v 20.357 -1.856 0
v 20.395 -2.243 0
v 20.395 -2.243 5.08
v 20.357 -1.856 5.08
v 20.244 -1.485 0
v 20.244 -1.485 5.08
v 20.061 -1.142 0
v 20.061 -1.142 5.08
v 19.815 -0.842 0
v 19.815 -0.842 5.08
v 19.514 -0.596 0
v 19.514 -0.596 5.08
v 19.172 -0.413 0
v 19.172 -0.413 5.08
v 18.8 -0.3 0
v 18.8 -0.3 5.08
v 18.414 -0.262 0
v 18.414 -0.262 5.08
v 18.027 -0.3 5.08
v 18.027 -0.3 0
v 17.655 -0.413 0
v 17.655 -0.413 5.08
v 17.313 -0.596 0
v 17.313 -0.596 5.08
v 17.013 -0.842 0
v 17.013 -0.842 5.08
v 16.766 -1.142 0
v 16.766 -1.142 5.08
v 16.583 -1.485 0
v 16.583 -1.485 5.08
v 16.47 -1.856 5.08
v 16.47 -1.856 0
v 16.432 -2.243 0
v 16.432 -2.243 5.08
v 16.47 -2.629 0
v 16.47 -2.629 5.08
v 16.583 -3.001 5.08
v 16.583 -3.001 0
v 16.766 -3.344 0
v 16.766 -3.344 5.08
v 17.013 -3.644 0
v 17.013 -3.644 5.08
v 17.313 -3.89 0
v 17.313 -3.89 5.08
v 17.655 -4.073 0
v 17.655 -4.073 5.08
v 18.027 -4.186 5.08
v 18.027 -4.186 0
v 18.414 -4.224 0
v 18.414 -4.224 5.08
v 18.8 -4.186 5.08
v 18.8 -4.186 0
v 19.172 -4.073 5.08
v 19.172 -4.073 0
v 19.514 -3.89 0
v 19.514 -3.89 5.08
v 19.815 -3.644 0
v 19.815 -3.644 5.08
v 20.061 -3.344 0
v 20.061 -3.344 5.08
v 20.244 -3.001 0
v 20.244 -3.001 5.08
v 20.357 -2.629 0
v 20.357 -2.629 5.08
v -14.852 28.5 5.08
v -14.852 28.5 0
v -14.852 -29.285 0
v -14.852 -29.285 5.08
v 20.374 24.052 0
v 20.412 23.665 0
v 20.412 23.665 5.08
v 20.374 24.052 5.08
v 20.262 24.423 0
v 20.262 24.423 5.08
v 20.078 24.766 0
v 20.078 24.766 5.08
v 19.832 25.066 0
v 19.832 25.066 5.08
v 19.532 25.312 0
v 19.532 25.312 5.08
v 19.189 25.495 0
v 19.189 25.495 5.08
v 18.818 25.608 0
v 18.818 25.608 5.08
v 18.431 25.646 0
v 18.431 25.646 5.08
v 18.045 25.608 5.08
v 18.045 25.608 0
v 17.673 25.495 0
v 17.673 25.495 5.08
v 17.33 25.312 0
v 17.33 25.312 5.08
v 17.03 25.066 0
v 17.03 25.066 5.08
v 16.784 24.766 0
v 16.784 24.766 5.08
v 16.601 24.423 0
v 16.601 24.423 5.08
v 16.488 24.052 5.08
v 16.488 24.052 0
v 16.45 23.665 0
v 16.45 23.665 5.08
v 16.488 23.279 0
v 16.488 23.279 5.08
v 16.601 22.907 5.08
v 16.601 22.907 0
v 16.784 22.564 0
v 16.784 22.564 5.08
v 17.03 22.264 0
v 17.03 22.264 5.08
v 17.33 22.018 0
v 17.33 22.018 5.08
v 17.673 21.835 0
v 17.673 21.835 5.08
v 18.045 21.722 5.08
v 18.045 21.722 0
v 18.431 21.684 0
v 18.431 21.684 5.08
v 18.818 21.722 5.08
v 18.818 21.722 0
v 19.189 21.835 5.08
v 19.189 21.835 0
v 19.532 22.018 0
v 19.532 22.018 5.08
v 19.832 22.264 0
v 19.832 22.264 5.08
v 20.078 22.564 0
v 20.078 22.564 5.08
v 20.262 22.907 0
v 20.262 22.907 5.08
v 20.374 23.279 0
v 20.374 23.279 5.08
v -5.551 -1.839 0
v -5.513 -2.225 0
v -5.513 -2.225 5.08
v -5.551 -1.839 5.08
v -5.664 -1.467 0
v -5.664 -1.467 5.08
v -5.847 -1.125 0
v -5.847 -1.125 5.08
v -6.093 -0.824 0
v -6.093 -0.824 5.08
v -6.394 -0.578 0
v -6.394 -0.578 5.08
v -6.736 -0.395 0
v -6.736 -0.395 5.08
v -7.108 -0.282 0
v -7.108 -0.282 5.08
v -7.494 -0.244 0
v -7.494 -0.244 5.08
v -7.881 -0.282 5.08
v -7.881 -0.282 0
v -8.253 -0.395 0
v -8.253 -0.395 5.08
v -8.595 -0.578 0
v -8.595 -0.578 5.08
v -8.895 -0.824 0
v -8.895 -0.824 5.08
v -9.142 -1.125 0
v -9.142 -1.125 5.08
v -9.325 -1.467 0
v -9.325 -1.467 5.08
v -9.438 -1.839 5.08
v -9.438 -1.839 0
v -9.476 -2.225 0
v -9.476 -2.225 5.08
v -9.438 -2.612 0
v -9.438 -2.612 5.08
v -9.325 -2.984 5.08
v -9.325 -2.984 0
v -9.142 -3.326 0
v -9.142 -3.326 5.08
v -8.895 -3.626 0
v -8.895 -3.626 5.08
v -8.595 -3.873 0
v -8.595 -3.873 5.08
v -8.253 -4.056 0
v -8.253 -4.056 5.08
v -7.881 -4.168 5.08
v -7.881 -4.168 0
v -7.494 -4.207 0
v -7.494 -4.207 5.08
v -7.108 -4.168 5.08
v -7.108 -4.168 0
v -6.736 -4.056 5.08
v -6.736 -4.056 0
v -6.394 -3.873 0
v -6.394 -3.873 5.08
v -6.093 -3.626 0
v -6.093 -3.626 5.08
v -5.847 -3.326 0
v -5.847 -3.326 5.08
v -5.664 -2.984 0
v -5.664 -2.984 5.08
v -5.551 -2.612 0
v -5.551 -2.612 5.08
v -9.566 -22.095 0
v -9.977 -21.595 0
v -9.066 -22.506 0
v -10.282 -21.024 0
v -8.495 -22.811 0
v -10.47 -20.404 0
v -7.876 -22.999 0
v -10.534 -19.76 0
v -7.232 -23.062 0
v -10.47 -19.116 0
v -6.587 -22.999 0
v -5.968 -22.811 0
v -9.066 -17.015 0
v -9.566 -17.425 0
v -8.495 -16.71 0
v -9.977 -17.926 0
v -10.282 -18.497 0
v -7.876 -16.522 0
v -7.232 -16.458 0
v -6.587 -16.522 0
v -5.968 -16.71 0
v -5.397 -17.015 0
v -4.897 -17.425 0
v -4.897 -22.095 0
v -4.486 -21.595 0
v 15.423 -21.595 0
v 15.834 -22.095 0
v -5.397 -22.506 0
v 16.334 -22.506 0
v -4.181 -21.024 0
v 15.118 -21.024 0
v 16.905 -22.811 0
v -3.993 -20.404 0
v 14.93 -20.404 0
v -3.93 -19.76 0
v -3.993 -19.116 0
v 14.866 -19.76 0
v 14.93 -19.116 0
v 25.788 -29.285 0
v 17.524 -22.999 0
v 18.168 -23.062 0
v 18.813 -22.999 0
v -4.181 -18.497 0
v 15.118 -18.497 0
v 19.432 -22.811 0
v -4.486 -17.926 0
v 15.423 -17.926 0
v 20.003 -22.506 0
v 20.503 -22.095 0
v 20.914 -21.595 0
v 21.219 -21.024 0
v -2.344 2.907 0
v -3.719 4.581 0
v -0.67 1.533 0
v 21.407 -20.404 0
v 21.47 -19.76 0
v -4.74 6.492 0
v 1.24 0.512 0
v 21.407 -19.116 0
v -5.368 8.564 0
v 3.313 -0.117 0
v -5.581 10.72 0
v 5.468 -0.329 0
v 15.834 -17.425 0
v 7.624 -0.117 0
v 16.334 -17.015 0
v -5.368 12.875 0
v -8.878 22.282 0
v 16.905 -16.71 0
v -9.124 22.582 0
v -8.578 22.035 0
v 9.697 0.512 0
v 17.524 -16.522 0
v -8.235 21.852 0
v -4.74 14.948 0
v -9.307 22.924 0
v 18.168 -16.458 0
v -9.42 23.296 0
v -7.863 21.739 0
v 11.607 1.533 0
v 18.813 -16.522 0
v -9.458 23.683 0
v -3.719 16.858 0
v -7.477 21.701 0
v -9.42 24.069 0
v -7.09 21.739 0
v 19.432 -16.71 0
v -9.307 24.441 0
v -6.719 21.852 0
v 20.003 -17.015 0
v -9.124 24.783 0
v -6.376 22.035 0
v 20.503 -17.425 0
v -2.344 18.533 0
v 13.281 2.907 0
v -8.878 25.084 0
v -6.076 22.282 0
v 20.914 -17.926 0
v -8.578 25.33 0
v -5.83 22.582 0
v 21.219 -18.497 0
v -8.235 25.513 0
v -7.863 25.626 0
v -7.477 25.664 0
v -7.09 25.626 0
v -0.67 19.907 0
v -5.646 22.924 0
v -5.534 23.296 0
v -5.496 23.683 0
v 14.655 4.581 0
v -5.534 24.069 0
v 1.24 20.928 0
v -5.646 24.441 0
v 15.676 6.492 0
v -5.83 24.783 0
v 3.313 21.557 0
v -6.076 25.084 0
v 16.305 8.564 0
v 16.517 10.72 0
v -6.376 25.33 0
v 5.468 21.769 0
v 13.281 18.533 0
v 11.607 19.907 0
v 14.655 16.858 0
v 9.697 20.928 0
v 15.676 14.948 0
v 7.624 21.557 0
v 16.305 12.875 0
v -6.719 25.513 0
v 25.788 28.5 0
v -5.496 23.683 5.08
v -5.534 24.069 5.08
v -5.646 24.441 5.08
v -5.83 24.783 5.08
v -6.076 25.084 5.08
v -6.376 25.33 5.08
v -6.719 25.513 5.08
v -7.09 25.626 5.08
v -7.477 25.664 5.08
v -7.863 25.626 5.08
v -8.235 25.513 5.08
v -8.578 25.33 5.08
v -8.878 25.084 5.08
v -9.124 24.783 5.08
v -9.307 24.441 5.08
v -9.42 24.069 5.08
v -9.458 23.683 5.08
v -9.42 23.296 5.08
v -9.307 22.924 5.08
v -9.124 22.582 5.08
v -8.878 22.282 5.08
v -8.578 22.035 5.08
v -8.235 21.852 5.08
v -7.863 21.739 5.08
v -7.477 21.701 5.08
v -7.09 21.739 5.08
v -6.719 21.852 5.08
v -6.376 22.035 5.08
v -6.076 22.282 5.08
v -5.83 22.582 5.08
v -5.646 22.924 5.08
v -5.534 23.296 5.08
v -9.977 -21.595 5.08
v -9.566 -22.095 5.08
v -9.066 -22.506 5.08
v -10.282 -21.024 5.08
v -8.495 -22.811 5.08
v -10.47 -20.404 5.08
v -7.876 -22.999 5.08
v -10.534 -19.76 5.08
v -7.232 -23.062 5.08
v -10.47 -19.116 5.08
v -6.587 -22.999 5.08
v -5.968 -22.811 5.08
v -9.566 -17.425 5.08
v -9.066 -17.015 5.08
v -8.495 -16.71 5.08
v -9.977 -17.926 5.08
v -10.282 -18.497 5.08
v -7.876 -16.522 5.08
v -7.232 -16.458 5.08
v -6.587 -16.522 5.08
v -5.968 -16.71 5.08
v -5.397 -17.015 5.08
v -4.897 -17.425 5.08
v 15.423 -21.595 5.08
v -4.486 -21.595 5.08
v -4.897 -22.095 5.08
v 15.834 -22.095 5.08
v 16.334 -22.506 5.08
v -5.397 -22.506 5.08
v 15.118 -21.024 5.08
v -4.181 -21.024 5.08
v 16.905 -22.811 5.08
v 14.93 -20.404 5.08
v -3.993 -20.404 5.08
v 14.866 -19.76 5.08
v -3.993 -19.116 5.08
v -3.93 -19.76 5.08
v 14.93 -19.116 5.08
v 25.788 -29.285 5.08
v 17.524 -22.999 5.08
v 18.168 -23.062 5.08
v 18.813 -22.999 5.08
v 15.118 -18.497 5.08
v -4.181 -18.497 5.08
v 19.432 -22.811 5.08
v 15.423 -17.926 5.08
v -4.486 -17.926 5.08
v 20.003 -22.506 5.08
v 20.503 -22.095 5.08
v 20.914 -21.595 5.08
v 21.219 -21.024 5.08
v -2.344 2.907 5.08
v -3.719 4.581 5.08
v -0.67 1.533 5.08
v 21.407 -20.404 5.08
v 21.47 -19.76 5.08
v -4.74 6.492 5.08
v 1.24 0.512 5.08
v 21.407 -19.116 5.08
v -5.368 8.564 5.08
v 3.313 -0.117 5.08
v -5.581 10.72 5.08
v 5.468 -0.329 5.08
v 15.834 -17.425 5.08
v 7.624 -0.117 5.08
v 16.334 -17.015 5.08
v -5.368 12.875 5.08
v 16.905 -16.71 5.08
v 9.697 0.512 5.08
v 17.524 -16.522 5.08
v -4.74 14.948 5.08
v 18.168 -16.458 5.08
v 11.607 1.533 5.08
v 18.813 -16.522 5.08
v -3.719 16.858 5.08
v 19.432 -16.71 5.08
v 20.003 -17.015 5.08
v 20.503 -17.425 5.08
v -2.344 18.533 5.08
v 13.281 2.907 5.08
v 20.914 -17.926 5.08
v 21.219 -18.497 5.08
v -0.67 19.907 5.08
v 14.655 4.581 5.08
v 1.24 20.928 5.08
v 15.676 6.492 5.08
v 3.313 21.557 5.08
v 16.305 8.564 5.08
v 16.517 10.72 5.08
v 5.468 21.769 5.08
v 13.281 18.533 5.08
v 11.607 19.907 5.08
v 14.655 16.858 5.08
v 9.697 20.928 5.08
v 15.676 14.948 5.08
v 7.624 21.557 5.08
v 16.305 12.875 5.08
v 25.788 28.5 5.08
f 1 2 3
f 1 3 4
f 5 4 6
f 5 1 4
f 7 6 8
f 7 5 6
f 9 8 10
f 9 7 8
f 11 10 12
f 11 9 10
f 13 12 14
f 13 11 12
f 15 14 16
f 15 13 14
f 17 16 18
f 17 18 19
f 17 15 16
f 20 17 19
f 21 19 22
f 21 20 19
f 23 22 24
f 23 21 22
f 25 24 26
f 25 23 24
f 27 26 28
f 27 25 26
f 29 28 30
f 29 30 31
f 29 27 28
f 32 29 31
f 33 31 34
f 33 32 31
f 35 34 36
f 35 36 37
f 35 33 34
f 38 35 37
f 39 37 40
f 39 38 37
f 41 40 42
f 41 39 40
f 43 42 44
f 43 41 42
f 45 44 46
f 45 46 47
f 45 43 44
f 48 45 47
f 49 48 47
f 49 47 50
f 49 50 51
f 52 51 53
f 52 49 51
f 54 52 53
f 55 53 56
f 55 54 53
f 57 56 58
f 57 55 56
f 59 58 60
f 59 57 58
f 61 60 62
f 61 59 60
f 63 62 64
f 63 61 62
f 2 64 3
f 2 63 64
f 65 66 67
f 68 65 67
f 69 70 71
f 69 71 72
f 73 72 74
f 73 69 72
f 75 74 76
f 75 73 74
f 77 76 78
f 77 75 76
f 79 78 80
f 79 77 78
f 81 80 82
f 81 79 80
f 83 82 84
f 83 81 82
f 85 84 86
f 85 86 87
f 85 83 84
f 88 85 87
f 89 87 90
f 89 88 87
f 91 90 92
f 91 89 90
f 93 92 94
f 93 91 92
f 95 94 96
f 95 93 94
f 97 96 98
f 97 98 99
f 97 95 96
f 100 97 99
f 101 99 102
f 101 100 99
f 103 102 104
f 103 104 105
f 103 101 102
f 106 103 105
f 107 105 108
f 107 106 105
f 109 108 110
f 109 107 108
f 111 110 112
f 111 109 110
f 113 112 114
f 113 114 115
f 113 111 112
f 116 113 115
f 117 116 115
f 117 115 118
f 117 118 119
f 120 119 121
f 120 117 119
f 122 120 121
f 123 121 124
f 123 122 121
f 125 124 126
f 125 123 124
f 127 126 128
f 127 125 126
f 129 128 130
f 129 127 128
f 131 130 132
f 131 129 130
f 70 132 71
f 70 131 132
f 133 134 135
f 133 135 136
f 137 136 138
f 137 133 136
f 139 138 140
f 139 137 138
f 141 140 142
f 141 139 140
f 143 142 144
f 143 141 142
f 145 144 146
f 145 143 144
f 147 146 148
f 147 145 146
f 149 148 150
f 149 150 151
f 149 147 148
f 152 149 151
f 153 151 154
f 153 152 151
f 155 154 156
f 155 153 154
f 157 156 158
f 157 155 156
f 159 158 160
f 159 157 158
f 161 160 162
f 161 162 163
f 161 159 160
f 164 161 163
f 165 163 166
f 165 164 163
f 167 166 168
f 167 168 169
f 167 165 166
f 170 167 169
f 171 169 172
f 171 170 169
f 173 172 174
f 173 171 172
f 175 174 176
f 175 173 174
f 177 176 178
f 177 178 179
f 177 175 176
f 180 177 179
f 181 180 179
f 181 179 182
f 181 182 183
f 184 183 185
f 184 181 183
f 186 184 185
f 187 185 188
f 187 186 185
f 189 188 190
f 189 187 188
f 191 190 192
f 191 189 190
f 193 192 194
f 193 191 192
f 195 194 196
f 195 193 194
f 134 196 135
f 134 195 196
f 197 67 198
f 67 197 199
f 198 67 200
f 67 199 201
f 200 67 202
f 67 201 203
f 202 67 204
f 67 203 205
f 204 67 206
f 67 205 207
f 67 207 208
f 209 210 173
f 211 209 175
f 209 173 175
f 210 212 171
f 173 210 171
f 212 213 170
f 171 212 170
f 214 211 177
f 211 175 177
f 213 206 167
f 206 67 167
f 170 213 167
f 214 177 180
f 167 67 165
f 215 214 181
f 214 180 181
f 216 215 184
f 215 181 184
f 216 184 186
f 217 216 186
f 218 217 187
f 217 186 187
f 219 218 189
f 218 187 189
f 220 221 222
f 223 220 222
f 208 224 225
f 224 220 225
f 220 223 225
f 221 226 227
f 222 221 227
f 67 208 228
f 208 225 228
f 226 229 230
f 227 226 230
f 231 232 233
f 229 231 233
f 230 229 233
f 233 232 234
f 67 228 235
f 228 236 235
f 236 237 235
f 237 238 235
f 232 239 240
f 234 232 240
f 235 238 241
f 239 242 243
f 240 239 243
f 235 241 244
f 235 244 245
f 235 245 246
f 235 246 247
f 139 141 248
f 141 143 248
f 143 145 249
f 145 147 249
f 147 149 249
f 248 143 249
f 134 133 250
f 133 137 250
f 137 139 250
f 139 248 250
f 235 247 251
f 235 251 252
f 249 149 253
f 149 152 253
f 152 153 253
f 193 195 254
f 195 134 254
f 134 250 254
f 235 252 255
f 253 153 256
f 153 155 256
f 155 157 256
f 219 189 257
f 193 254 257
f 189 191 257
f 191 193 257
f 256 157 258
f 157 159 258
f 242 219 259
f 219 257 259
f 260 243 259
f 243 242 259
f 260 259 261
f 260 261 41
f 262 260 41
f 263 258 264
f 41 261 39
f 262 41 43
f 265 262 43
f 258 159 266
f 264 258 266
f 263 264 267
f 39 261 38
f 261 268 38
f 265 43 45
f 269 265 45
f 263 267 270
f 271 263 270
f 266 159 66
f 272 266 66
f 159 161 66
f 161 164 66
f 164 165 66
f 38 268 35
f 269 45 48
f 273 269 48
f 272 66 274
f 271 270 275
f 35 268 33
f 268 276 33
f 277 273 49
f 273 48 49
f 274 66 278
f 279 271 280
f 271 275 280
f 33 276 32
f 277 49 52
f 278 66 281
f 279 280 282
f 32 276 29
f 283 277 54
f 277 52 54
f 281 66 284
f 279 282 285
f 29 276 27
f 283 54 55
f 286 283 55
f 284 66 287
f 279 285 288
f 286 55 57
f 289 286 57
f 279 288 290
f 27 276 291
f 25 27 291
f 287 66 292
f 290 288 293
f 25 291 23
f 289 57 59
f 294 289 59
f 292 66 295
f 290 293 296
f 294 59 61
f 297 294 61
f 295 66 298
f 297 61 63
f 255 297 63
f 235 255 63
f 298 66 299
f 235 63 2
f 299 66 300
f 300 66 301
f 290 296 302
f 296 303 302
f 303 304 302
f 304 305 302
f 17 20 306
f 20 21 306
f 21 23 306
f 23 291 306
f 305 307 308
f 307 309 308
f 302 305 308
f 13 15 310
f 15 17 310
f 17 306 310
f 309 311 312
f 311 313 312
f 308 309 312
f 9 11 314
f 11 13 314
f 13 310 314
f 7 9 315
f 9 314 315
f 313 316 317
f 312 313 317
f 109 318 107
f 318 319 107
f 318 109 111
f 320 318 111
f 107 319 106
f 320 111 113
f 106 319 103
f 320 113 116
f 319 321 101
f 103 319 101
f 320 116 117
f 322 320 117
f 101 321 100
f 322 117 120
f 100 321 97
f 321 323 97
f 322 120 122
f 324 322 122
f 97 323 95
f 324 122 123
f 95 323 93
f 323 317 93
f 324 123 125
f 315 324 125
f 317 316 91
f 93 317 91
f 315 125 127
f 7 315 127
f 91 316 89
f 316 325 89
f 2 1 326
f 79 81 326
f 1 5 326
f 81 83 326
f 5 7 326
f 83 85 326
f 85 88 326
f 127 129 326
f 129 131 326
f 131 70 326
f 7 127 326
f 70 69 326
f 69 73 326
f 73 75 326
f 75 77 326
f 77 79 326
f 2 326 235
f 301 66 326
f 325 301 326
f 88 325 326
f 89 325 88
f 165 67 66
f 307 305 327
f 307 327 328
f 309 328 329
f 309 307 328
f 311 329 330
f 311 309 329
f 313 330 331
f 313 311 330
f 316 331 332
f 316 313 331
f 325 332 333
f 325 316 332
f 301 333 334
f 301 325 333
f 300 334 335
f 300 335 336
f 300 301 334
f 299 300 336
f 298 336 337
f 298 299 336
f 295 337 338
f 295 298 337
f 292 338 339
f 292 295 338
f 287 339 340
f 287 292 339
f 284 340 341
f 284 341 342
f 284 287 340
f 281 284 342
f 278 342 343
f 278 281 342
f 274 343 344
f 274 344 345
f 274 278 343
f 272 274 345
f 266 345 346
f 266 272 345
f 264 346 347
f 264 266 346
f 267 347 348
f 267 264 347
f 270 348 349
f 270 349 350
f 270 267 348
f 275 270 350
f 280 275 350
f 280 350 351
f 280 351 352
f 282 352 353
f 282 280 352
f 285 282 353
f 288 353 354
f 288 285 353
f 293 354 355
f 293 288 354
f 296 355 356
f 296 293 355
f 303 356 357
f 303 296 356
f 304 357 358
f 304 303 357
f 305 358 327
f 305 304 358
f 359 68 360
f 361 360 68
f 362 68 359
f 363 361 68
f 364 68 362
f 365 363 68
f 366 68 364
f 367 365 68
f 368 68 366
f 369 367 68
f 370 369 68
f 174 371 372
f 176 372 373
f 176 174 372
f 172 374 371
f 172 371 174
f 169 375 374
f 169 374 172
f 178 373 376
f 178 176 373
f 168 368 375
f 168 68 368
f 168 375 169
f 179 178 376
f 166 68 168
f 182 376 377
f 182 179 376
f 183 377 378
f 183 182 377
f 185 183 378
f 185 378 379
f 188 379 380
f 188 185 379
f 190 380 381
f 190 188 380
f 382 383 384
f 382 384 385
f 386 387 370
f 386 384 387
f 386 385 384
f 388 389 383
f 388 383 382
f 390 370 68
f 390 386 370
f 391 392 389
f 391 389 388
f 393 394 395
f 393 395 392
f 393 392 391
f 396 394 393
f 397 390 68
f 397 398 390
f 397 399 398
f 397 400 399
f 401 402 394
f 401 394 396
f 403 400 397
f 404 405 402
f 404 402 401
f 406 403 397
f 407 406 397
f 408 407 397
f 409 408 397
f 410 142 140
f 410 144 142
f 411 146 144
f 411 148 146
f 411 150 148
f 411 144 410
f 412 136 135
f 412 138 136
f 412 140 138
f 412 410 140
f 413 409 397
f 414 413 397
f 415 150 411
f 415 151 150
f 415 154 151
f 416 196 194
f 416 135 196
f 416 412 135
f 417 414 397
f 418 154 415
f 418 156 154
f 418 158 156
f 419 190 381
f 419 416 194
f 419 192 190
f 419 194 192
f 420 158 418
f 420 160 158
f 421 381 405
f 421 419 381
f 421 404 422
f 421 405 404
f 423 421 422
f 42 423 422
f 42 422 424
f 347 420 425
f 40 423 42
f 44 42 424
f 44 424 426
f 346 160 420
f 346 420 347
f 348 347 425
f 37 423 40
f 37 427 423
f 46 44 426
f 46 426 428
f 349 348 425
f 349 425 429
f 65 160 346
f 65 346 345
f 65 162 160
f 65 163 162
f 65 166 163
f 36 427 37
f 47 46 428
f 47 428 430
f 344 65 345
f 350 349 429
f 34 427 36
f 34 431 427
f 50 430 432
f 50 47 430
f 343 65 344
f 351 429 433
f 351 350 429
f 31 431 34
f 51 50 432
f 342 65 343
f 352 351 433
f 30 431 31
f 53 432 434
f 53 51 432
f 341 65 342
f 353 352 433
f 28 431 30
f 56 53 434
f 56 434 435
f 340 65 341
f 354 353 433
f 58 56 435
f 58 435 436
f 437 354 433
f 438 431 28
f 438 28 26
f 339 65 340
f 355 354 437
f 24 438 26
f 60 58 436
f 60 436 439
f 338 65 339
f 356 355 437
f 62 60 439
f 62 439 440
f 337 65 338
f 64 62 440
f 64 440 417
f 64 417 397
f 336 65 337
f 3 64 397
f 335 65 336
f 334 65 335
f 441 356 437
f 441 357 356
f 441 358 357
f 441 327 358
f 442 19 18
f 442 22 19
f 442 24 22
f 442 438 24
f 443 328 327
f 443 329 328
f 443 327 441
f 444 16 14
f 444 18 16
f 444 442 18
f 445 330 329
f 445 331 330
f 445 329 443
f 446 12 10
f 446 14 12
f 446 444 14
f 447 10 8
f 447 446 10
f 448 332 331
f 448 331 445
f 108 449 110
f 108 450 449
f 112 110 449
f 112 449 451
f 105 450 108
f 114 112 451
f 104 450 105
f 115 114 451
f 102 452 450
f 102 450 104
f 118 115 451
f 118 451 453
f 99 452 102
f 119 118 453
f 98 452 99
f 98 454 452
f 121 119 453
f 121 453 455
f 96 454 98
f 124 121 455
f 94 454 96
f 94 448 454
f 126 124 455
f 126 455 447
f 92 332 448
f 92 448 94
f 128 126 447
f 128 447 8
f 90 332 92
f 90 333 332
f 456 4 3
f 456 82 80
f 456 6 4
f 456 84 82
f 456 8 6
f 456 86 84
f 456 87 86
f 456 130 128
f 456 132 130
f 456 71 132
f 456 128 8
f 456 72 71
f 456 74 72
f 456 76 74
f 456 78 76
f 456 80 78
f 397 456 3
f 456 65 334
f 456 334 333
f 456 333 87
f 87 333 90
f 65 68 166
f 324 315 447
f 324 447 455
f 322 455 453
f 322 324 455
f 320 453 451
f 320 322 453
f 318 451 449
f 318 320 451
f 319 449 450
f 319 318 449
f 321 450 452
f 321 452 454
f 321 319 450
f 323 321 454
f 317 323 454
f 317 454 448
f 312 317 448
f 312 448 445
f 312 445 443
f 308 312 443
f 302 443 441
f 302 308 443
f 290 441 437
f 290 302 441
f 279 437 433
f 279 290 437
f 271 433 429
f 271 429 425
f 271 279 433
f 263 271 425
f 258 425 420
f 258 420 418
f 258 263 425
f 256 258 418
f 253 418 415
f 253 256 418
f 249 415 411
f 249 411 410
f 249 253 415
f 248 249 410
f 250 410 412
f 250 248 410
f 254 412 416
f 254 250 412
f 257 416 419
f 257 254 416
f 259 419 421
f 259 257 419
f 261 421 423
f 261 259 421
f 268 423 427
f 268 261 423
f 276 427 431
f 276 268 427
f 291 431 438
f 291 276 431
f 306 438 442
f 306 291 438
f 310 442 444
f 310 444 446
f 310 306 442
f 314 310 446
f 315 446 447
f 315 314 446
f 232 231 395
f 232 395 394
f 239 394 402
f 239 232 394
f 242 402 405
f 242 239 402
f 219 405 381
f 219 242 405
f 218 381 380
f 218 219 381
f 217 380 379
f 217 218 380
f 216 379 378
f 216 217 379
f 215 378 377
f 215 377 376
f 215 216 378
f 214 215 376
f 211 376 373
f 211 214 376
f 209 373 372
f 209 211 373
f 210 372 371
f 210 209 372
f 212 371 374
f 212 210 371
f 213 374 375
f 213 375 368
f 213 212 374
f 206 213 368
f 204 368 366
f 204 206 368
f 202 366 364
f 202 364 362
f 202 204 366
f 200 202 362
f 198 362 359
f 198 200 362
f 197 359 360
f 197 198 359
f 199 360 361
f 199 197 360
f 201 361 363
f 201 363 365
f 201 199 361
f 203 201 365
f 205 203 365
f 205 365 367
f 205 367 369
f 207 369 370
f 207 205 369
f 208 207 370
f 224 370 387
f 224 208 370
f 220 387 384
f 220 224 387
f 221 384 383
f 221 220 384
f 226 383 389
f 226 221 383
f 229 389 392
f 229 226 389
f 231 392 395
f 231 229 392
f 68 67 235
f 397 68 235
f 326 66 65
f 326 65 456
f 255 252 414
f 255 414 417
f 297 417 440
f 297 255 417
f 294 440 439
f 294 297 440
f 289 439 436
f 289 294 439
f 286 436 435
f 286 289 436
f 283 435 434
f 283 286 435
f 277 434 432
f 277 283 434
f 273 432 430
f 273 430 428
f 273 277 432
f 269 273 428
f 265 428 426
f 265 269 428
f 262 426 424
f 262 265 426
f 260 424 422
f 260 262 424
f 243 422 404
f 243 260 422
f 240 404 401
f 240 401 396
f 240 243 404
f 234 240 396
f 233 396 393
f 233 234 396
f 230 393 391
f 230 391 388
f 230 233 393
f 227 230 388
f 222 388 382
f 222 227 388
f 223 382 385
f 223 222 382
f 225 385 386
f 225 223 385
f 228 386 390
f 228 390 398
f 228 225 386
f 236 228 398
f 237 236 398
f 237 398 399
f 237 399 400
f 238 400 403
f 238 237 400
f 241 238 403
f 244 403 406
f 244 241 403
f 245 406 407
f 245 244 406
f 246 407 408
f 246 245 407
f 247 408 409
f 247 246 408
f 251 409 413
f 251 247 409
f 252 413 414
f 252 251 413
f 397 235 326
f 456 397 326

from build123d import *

# Parameters (mm, degrees)
SKETCH1_W           = 40.64
SKETCH1_H           = 19.05
SKETCH1_R           = 3.302
SKETCH1_H_2         = 38.735
SKETCH1_R_2         = 1.9812
SKETCH1_R_3         = 11.049
BOSS_EXTRUDE1_DEPTH = 5.08


with BuildPart() as part:
    # Sketch1 → Boss-Extrude1 (new body)
    with BuildSketch(Plane.XY):
        with Locations((5.46838271, -19.760168498)):
            Rectangle(SKETCH1_W, SKETCH1_H)
        with Locations((-7.23161729, -19.760168498)):
            Circle(SKETCH1_R, mode=Mode.SUBTRACT)
        with Locations((18.16838271, -19.760168498)):
            Circle(SKETCH1_R, mode=Mode.SUBTRACT)
        with Locations((5.46838271, 9.132331502)):
            Rectangle(SKETCH1_W, SKETCH1_H_2)
        with Locations((-7.494416142, -2.225366655)):
            Circle(SKETCH1_R_2, mode=Mode.SUBTRACT)
        with Locations((18.413583858, -2.242964365)):
            Circle(SKETCH1_R_2, mode=Mode.SUBTRACT)
        with Locations((-7.476818437, 23.682627368)):
            Circle(SKETCH1_R_2, mode=Mode.SUBTRACT)
        with Locations((5.46838271, 10.719831502)):
            Circle(SKETCH1_R_3, mode=Mode.SUBTRACT)
        with Locations((18.431181563, 23.665029659)):
            Circle(SKETCH1_R_2, mode=Mode.SUBTRACT)
    extrude(amount=BOSS_EXTRUDE1_DEPTH)


solid = part.part
